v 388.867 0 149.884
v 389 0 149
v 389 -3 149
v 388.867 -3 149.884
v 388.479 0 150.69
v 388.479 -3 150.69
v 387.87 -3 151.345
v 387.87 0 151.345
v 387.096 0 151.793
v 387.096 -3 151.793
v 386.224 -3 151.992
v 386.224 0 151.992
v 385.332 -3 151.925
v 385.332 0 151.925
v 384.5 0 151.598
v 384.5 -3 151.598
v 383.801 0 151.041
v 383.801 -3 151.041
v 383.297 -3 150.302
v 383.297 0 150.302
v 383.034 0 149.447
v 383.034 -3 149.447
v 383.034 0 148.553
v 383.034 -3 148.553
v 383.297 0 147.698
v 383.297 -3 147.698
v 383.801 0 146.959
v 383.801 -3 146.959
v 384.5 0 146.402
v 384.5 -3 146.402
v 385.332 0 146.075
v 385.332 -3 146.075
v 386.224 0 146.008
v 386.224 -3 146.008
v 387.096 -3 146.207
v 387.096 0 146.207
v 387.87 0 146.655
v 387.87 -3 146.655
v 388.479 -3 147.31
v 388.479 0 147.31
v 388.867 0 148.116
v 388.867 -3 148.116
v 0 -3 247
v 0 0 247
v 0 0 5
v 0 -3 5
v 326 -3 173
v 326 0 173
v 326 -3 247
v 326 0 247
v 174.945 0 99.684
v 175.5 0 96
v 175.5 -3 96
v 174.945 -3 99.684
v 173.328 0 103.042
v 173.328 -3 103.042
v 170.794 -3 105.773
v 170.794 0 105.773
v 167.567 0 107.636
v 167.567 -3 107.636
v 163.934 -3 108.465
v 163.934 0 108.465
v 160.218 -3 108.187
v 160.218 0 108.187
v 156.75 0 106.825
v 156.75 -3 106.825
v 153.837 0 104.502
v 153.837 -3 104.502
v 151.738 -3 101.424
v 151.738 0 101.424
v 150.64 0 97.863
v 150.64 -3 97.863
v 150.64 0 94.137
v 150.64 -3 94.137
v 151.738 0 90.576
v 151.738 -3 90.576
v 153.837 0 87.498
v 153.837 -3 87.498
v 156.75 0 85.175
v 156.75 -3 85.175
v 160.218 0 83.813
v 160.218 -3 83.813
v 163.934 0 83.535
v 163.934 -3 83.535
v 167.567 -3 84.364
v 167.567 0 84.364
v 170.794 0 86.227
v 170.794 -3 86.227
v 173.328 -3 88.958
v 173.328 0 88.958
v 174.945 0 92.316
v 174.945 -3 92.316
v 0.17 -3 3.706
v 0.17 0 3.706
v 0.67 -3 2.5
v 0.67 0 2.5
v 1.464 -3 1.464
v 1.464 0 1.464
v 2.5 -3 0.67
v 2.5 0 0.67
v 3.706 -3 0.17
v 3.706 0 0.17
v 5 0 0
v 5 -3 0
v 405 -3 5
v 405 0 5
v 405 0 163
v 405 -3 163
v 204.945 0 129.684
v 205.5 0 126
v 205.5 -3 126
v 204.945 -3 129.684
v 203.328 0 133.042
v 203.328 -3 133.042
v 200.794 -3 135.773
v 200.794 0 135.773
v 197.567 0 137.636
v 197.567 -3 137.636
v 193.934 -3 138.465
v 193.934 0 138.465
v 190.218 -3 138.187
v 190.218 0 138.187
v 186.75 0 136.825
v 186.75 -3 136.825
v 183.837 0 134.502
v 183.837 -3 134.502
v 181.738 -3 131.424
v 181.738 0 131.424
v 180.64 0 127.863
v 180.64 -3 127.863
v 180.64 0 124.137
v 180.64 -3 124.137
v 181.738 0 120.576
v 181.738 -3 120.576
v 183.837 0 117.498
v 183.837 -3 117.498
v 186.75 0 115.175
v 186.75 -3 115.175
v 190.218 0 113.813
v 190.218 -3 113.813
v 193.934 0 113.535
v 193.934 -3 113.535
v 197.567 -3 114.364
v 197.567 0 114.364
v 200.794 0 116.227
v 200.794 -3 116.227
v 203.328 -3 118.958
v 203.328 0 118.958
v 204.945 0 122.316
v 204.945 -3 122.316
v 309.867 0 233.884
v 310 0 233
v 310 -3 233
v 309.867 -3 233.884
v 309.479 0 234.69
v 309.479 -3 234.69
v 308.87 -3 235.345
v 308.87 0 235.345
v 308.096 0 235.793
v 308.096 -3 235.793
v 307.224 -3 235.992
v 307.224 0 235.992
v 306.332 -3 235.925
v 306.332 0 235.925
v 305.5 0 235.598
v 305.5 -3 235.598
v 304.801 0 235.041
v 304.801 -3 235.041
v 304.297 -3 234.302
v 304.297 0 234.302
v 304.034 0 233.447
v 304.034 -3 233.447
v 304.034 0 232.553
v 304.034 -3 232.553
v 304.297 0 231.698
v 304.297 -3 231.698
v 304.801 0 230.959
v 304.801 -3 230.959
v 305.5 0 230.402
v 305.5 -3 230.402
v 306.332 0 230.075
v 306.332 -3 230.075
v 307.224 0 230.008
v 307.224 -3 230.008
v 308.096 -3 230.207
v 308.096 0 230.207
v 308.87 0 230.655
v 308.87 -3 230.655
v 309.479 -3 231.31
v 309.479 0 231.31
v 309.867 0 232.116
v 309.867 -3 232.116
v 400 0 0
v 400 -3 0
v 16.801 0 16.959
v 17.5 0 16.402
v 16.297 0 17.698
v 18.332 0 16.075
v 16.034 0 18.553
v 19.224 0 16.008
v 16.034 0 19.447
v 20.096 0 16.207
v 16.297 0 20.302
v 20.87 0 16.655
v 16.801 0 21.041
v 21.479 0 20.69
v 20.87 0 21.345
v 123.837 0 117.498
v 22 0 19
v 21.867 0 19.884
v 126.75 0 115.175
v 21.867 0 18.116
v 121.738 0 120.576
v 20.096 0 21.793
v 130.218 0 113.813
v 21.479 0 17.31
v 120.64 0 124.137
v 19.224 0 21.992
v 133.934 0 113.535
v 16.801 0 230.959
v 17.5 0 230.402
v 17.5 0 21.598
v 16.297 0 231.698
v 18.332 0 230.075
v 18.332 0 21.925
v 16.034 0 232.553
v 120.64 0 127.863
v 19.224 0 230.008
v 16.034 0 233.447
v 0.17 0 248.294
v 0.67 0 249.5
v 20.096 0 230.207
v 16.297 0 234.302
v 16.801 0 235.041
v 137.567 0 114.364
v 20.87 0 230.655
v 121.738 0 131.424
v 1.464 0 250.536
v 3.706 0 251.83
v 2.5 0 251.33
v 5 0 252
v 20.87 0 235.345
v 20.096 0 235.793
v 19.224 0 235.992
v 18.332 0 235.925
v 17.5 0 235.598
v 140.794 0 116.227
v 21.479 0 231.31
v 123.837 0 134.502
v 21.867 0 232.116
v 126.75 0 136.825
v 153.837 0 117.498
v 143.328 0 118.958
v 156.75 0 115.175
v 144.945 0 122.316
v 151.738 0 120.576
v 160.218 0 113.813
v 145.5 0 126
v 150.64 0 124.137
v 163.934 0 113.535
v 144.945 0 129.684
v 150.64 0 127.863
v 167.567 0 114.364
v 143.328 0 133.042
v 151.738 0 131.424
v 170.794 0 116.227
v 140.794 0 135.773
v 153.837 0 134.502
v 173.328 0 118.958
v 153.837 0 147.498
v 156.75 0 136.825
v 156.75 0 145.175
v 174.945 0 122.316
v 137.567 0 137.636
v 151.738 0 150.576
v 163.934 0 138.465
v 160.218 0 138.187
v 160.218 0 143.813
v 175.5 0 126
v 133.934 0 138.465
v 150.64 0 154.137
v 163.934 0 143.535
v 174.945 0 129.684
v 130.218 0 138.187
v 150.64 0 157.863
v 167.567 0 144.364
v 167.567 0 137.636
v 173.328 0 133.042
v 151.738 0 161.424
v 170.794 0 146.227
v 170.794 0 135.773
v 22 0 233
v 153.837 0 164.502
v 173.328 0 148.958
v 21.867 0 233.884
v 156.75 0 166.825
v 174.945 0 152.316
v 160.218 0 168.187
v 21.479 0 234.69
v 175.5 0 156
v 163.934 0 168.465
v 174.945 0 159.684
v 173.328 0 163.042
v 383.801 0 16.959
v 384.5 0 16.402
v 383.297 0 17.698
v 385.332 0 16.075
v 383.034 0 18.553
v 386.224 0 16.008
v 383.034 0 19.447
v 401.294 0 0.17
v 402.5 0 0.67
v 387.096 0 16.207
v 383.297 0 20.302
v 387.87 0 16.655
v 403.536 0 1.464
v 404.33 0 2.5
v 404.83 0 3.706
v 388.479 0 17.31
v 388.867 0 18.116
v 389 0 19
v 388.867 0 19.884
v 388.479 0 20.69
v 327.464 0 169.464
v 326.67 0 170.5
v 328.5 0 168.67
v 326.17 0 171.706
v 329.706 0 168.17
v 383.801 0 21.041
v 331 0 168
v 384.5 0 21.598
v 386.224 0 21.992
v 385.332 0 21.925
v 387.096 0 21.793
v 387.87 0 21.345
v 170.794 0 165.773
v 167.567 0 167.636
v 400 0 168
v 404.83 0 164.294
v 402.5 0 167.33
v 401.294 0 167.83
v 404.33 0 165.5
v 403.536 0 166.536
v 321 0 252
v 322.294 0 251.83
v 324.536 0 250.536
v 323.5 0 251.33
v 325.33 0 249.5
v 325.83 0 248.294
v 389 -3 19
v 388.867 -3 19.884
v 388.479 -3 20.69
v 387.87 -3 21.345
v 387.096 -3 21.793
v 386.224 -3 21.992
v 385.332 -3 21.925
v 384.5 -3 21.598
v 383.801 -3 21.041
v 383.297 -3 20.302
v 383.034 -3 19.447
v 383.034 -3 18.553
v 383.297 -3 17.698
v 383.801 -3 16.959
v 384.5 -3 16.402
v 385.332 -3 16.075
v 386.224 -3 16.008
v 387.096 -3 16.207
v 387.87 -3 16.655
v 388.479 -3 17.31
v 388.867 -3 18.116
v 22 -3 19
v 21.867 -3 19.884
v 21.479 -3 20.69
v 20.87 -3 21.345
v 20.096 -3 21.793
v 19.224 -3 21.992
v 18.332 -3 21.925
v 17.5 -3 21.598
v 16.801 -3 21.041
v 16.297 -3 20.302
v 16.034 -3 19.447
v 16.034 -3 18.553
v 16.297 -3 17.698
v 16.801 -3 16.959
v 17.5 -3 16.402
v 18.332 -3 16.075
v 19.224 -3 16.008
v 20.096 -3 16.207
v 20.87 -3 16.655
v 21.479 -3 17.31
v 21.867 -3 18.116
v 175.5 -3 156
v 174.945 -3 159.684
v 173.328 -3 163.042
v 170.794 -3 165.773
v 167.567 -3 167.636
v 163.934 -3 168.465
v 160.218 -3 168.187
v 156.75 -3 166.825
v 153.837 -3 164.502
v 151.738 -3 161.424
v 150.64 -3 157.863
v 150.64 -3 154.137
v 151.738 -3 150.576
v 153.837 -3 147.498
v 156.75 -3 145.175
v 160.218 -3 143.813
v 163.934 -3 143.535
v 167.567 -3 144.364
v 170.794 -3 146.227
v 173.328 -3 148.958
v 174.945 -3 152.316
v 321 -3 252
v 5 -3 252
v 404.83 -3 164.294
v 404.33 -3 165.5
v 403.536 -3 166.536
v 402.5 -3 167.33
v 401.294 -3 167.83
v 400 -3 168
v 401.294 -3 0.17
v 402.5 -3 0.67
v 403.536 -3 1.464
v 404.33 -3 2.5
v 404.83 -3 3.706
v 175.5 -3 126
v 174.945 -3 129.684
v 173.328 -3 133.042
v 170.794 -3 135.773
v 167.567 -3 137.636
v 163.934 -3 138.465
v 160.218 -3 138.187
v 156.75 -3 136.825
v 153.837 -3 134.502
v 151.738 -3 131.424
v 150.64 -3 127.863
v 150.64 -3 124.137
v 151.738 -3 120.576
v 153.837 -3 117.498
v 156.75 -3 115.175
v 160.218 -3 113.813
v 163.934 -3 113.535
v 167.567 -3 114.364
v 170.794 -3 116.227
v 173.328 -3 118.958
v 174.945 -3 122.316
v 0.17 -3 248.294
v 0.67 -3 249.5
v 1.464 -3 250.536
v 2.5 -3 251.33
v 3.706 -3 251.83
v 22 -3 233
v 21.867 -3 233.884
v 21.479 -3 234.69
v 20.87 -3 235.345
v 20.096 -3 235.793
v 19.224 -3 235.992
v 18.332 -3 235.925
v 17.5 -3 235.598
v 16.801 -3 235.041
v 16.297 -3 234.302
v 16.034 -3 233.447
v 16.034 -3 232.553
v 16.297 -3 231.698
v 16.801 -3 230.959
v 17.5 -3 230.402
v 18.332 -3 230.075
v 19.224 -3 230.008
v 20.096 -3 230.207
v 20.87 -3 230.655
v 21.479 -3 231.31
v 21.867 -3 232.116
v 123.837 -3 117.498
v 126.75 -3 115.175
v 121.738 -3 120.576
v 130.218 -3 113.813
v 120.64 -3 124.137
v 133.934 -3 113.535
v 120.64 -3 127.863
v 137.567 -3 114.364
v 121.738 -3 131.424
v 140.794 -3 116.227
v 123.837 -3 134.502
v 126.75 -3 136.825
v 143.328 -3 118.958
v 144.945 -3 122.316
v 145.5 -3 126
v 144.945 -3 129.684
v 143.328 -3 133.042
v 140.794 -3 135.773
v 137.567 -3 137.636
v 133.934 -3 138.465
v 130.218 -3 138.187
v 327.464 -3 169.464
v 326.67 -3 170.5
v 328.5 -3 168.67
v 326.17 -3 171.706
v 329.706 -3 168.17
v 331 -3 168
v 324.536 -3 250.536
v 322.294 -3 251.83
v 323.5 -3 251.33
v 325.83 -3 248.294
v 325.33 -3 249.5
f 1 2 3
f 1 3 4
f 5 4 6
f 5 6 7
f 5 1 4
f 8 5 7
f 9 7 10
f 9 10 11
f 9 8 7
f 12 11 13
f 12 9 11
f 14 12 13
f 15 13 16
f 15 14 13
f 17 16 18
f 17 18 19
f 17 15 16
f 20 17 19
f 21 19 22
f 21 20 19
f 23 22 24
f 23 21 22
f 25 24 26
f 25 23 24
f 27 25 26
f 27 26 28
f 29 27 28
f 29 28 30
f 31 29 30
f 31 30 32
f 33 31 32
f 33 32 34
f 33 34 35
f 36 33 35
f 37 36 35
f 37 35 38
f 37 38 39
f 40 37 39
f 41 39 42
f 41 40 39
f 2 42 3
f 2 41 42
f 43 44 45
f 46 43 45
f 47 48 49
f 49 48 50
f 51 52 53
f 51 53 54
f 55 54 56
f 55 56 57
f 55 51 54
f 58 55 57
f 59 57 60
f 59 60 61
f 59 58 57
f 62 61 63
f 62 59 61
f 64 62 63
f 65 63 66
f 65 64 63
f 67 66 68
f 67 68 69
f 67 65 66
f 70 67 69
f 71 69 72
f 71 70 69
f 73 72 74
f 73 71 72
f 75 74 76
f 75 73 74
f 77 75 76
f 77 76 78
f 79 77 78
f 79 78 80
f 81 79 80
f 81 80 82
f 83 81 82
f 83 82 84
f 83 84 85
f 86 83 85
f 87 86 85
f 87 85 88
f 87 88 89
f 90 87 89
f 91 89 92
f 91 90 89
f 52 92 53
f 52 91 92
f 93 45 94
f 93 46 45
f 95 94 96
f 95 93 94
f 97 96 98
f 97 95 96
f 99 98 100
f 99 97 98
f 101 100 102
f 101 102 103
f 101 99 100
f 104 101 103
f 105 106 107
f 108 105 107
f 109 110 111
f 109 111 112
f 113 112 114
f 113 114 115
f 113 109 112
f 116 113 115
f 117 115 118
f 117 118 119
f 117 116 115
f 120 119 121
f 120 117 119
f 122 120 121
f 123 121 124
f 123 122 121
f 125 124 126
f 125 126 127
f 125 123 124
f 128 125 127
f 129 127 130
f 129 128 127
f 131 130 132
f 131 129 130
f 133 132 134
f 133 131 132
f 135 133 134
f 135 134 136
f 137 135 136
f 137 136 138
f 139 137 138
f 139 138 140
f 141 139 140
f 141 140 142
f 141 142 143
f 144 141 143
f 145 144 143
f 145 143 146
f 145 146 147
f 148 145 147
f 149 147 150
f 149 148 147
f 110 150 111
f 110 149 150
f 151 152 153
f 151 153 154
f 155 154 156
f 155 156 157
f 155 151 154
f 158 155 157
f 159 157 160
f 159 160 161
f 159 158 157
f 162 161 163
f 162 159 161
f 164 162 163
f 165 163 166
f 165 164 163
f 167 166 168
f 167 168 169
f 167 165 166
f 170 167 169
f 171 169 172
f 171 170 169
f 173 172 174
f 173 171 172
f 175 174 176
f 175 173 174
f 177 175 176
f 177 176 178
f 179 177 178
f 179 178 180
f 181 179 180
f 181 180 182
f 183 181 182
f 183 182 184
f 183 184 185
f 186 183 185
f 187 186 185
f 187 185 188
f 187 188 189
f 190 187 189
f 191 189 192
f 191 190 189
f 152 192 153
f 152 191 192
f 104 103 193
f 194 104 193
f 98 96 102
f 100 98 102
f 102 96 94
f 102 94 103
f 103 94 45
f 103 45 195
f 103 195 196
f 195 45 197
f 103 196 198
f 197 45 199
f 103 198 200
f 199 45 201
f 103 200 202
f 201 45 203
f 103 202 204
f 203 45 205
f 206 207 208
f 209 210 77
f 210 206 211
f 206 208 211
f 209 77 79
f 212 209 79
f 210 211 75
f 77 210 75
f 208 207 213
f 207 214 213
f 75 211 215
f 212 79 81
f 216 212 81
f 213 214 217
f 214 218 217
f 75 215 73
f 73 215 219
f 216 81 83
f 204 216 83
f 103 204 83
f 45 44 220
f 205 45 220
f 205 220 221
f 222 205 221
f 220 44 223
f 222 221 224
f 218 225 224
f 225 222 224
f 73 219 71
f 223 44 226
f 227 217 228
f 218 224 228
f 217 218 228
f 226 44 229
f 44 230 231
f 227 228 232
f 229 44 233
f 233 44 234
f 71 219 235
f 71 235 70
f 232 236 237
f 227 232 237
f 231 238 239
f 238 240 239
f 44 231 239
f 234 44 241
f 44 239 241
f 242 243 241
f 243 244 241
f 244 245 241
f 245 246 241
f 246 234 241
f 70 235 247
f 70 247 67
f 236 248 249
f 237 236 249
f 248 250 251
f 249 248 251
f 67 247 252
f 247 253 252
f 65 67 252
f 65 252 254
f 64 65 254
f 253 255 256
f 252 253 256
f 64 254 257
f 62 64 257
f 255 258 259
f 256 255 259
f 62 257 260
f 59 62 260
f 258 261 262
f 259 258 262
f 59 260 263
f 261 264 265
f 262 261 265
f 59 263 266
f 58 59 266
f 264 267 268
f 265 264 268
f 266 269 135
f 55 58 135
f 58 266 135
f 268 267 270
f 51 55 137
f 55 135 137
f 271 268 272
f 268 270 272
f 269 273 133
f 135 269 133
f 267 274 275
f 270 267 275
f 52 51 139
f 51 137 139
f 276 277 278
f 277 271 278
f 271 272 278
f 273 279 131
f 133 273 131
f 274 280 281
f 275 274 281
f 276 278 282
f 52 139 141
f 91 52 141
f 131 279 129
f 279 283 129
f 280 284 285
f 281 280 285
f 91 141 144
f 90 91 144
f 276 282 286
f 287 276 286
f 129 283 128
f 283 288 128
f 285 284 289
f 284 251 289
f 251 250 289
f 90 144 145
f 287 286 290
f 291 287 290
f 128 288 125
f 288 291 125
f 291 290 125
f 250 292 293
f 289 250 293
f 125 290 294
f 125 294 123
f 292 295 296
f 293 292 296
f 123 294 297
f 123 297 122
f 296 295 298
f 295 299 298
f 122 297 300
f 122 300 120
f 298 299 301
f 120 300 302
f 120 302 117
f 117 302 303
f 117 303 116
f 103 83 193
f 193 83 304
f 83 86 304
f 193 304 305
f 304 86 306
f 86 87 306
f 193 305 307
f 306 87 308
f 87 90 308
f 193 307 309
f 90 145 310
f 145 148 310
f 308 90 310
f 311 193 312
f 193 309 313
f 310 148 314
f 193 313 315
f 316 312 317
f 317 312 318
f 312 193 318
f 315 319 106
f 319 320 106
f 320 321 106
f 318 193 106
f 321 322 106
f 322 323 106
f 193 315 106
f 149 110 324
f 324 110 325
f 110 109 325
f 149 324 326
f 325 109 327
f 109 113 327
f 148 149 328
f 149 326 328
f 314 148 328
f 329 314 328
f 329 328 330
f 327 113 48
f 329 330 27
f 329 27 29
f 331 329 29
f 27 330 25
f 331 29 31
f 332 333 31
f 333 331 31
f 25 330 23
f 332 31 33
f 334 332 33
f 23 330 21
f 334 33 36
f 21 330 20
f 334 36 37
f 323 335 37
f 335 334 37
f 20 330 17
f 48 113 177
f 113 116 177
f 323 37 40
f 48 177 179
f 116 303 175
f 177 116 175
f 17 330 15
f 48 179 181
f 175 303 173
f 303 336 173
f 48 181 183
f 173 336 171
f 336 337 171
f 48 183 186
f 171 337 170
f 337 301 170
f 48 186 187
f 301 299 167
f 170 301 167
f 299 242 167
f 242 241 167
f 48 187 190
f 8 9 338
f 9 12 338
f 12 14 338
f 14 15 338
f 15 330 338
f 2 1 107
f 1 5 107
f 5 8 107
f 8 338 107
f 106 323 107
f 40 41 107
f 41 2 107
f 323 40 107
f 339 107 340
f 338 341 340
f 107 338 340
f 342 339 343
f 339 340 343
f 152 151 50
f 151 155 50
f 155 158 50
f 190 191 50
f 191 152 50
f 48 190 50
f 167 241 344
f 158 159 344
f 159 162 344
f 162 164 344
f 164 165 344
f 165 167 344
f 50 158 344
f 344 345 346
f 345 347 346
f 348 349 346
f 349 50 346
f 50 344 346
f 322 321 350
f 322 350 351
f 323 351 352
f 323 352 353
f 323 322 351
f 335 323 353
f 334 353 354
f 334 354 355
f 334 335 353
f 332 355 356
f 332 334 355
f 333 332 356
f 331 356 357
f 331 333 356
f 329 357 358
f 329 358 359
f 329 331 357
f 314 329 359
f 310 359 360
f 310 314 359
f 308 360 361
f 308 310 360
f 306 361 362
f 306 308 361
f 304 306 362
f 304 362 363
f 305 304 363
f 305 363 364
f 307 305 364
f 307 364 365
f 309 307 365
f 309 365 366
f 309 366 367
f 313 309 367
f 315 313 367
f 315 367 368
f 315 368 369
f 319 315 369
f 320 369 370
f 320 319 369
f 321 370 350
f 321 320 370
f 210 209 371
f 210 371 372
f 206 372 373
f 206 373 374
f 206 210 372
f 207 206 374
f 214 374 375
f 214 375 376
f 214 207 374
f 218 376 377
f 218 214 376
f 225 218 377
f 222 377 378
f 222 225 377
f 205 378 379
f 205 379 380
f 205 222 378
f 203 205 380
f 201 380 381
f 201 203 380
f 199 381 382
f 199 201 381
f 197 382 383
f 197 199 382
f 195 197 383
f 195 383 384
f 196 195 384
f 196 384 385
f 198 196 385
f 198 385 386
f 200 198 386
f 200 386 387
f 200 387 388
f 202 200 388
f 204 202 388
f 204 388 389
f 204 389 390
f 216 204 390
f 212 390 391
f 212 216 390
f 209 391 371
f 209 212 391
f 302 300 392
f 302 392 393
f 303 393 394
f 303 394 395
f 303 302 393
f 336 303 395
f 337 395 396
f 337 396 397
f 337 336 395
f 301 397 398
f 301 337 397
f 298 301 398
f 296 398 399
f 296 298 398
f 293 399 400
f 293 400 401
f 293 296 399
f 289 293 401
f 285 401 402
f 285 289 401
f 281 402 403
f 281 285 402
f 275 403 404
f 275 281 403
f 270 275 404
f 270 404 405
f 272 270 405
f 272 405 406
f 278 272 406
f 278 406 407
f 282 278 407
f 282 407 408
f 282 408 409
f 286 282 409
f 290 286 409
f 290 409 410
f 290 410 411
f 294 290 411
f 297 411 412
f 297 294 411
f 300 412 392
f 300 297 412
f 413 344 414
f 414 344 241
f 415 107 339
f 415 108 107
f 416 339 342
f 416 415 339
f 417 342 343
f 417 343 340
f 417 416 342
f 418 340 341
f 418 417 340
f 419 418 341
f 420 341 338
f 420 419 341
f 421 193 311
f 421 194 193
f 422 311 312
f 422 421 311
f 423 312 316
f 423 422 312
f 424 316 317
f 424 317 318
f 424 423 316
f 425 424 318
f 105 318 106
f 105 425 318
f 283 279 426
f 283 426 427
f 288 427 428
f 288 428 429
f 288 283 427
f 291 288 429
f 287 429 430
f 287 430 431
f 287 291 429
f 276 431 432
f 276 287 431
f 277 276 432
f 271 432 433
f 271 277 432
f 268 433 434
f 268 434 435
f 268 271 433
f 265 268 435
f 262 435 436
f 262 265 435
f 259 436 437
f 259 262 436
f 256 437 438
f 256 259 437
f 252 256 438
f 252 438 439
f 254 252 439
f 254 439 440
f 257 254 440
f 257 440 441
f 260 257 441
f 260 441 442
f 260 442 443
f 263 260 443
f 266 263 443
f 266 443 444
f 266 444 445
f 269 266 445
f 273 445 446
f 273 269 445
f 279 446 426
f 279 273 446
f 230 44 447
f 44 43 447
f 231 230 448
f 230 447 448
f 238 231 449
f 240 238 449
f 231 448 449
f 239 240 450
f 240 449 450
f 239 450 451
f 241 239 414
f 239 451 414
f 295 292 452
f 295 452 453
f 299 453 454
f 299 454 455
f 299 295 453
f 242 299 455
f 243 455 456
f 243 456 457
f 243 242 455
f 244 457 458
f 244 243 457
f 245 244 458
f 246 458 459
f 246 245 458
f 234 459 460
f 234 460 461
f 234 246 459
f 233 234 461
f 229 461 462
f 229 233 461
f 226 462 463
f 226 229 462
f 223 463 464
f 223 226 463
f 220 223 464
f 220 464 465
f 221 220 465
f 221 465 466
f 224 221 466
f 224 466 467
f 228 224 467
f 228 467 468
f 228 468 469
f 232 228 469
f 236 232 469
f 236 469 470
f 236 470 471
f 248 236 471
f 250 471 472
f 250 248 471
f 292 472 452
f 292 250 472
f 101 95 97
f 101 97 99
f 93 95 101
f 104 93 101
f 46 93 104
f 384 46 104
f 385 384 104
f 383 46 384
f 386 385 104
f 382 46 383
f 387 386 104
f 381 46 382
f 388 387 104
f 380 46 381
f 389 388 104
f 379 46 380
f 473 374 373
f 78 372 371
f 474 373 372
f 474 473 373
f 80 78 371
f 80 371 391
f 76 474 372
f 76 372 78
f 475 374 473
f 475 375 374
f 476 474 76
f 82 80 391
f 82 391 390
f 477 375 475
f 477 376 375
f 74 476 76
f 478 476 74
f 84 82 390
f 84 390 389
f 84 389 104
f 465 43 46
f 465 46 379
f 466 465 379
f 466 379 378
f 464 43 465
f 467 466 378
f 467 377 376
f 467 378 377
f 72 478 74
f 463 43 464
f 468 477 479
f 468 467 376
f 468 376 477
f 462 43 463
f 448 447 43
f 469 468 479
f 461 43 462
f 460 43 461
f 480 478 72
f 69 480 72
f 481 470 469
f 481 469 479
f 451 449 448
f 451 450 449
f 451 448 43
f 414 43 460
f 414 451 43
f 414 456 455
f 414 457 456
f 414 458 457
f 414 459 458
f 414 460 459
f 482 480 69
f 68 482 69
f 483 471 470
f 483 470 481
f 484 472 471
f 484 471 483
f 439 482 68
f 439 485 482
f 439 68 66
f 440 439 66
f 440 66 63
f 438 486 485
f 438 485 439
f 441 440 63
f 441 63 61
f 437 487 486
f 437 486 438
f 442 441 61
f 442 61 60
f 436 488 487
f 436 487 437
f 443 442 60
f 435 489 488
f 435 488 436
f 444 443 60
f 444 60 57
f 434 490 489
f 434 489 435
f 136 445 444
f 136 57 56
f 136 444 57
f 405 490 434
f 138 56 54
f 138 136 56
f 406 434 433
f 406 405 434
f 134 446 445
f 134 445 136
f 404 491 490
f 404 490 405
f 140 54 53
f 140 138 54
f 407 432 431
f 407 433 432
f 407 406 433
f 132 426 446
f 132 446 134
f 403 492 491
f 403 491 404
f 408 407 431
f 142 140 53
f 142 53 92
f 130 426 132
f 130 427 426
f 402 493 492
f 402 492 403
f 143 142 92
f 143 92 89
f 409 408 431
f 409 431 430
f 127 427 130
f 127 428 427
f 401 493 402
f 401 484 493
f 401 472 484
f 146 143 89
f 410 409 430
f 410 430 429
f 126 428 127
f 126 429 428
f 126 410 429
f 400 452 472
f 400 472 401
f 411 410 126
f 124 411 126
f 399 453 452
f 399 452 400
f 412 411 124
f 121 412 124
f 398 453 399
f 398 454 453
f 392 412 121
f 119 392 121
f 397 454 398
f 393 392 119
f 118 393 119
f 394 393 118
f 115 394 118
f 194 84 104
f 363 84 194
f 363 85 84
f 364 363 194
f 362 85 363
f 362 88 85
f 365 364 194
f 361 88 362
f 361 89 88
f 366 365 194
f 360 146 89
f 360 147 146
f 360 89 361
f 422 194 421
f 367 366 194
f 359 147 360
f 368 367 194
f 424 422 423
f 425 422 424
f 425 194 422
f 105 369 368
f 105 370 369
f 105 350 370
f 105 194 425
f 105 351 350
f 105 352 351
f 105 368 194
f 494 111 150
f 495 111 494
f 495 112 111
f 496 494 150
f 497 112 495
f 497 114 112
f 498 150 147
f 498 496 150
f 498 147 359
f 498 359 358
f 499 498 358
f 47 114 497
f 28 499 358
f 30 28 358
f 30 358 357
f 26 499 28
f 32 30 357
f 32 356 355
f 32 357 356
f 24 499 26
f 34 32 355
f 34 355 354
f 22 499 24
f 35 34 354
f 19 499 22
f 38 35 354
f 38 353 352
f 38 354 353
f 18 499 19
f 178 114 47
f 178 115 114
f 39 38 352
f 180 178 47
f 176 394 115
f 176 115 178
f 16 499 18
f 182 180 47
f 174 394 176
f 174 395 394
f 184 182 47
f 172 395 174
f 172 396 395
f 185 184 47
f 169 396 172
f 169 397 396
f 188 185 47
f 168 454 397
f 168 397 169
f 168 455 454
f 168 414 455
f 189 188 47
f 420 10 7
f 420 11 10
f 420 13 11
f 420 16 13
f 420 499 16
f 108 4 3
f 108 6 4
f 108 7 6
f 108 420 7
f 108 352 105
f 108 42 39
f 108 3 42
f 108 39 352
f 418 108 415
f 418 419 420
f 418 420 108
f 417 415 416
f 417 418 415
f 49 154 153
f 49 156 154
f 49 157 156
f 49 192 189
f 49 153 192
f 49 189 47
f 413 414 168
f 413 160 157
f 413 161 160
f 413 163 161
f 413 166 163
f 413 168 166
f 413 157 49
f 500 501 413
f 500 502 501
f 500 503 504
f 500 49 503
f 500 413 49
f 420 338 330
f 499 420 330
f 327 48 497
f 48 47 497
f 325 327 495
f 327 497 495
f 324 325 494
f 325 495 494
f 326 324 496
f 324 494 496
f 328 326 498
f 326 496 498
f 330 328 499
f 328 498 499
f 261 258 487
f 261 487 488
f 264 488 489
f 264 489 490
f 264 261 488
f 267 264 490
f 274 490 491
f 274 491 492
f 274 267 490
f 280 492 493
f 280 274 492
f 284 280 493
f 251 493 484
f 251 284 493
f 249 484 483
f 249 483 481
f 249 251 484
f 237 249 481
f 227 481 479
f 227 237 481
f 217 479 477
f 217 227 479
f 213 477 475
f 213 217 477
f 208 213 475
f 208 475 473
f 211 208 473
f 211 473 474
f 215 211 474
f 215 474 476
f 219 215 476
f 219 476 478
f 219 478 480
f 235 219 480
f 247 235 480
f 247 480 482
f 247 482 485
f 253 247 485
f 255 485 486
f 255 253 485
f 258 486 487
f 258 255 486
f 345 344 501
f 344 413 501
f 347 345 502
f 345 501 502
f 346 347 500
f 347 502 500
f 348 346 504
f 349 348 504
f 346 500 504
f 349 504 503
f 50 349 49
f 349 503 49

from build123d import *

# Parameters (mm, degrees)
F0_R     = 3
F0_R_2   = 12.5
F1_DEPTH = 3
F2_R     = 5
F3_R     = 5


with BuildPart() as f1:
    # F0 (on Front) → F1 (new body)
    with BuildSketch(Plane.XZ):
        Polygon((0, 252), (0, 0), (405, 0), (405, 168), (326, 168), (326, 252), align=None)
        with Locations((19, 19)):
            Circle(F0_R, mode=Mode.SUBTRACT)
        with Locations((163, 96)):
            Circle(F0_R_2, mode=Mode.SUBTRACT)
        with Locations((386, 19)):
            Circle(F0_R, mode=Mode.SUBTRACT)
        with Locations((133, 126)):
            Circle(F0_R_2, mode=Mode.SUBTRACT)
        with Locations((163, 126)):
            Circle(F0_R_2, mode=Mode.SUBTRACT)
        with Locations((193, 126)):
            Circle(F0_R_2, mode=Mode.SUBTRACT)
        with Locations((163, 156)):
            Circle(F0_R_2, mode=Mode.SUBTRACT)
        with Locations((19, 233)):
            Circle(F0_R, mode=Mode.SUBTRACT)
        with Locations((386, 149)):
            Circle(F0_R, mode=Mode.SUBTRACT)
        with Locations((307, 233)):
            Circle(F0_R, mode=Mode.SUBTRACT)
    extrude(amount=F1_DEPTH)

    # F2
    f2_edges = [f1.edges().sort_by_distance(p)[0] for p in [
        (326, -1.5, 252),
        (405, -1.5, 168),
        (405, -1.5, 0),
        (0, -1.5, 0),
        (0, -1.5, 252),
    ]]
    fillet(f2_edges, radius=F2_R)

    # F3
    f3_edges = [f1.edges().sort_by_distance(p)[0] for p in [
        (326, -1.5, 168),
    ]]
    fillet(f3_edges, radius=F3_R)


solid = f1.part
